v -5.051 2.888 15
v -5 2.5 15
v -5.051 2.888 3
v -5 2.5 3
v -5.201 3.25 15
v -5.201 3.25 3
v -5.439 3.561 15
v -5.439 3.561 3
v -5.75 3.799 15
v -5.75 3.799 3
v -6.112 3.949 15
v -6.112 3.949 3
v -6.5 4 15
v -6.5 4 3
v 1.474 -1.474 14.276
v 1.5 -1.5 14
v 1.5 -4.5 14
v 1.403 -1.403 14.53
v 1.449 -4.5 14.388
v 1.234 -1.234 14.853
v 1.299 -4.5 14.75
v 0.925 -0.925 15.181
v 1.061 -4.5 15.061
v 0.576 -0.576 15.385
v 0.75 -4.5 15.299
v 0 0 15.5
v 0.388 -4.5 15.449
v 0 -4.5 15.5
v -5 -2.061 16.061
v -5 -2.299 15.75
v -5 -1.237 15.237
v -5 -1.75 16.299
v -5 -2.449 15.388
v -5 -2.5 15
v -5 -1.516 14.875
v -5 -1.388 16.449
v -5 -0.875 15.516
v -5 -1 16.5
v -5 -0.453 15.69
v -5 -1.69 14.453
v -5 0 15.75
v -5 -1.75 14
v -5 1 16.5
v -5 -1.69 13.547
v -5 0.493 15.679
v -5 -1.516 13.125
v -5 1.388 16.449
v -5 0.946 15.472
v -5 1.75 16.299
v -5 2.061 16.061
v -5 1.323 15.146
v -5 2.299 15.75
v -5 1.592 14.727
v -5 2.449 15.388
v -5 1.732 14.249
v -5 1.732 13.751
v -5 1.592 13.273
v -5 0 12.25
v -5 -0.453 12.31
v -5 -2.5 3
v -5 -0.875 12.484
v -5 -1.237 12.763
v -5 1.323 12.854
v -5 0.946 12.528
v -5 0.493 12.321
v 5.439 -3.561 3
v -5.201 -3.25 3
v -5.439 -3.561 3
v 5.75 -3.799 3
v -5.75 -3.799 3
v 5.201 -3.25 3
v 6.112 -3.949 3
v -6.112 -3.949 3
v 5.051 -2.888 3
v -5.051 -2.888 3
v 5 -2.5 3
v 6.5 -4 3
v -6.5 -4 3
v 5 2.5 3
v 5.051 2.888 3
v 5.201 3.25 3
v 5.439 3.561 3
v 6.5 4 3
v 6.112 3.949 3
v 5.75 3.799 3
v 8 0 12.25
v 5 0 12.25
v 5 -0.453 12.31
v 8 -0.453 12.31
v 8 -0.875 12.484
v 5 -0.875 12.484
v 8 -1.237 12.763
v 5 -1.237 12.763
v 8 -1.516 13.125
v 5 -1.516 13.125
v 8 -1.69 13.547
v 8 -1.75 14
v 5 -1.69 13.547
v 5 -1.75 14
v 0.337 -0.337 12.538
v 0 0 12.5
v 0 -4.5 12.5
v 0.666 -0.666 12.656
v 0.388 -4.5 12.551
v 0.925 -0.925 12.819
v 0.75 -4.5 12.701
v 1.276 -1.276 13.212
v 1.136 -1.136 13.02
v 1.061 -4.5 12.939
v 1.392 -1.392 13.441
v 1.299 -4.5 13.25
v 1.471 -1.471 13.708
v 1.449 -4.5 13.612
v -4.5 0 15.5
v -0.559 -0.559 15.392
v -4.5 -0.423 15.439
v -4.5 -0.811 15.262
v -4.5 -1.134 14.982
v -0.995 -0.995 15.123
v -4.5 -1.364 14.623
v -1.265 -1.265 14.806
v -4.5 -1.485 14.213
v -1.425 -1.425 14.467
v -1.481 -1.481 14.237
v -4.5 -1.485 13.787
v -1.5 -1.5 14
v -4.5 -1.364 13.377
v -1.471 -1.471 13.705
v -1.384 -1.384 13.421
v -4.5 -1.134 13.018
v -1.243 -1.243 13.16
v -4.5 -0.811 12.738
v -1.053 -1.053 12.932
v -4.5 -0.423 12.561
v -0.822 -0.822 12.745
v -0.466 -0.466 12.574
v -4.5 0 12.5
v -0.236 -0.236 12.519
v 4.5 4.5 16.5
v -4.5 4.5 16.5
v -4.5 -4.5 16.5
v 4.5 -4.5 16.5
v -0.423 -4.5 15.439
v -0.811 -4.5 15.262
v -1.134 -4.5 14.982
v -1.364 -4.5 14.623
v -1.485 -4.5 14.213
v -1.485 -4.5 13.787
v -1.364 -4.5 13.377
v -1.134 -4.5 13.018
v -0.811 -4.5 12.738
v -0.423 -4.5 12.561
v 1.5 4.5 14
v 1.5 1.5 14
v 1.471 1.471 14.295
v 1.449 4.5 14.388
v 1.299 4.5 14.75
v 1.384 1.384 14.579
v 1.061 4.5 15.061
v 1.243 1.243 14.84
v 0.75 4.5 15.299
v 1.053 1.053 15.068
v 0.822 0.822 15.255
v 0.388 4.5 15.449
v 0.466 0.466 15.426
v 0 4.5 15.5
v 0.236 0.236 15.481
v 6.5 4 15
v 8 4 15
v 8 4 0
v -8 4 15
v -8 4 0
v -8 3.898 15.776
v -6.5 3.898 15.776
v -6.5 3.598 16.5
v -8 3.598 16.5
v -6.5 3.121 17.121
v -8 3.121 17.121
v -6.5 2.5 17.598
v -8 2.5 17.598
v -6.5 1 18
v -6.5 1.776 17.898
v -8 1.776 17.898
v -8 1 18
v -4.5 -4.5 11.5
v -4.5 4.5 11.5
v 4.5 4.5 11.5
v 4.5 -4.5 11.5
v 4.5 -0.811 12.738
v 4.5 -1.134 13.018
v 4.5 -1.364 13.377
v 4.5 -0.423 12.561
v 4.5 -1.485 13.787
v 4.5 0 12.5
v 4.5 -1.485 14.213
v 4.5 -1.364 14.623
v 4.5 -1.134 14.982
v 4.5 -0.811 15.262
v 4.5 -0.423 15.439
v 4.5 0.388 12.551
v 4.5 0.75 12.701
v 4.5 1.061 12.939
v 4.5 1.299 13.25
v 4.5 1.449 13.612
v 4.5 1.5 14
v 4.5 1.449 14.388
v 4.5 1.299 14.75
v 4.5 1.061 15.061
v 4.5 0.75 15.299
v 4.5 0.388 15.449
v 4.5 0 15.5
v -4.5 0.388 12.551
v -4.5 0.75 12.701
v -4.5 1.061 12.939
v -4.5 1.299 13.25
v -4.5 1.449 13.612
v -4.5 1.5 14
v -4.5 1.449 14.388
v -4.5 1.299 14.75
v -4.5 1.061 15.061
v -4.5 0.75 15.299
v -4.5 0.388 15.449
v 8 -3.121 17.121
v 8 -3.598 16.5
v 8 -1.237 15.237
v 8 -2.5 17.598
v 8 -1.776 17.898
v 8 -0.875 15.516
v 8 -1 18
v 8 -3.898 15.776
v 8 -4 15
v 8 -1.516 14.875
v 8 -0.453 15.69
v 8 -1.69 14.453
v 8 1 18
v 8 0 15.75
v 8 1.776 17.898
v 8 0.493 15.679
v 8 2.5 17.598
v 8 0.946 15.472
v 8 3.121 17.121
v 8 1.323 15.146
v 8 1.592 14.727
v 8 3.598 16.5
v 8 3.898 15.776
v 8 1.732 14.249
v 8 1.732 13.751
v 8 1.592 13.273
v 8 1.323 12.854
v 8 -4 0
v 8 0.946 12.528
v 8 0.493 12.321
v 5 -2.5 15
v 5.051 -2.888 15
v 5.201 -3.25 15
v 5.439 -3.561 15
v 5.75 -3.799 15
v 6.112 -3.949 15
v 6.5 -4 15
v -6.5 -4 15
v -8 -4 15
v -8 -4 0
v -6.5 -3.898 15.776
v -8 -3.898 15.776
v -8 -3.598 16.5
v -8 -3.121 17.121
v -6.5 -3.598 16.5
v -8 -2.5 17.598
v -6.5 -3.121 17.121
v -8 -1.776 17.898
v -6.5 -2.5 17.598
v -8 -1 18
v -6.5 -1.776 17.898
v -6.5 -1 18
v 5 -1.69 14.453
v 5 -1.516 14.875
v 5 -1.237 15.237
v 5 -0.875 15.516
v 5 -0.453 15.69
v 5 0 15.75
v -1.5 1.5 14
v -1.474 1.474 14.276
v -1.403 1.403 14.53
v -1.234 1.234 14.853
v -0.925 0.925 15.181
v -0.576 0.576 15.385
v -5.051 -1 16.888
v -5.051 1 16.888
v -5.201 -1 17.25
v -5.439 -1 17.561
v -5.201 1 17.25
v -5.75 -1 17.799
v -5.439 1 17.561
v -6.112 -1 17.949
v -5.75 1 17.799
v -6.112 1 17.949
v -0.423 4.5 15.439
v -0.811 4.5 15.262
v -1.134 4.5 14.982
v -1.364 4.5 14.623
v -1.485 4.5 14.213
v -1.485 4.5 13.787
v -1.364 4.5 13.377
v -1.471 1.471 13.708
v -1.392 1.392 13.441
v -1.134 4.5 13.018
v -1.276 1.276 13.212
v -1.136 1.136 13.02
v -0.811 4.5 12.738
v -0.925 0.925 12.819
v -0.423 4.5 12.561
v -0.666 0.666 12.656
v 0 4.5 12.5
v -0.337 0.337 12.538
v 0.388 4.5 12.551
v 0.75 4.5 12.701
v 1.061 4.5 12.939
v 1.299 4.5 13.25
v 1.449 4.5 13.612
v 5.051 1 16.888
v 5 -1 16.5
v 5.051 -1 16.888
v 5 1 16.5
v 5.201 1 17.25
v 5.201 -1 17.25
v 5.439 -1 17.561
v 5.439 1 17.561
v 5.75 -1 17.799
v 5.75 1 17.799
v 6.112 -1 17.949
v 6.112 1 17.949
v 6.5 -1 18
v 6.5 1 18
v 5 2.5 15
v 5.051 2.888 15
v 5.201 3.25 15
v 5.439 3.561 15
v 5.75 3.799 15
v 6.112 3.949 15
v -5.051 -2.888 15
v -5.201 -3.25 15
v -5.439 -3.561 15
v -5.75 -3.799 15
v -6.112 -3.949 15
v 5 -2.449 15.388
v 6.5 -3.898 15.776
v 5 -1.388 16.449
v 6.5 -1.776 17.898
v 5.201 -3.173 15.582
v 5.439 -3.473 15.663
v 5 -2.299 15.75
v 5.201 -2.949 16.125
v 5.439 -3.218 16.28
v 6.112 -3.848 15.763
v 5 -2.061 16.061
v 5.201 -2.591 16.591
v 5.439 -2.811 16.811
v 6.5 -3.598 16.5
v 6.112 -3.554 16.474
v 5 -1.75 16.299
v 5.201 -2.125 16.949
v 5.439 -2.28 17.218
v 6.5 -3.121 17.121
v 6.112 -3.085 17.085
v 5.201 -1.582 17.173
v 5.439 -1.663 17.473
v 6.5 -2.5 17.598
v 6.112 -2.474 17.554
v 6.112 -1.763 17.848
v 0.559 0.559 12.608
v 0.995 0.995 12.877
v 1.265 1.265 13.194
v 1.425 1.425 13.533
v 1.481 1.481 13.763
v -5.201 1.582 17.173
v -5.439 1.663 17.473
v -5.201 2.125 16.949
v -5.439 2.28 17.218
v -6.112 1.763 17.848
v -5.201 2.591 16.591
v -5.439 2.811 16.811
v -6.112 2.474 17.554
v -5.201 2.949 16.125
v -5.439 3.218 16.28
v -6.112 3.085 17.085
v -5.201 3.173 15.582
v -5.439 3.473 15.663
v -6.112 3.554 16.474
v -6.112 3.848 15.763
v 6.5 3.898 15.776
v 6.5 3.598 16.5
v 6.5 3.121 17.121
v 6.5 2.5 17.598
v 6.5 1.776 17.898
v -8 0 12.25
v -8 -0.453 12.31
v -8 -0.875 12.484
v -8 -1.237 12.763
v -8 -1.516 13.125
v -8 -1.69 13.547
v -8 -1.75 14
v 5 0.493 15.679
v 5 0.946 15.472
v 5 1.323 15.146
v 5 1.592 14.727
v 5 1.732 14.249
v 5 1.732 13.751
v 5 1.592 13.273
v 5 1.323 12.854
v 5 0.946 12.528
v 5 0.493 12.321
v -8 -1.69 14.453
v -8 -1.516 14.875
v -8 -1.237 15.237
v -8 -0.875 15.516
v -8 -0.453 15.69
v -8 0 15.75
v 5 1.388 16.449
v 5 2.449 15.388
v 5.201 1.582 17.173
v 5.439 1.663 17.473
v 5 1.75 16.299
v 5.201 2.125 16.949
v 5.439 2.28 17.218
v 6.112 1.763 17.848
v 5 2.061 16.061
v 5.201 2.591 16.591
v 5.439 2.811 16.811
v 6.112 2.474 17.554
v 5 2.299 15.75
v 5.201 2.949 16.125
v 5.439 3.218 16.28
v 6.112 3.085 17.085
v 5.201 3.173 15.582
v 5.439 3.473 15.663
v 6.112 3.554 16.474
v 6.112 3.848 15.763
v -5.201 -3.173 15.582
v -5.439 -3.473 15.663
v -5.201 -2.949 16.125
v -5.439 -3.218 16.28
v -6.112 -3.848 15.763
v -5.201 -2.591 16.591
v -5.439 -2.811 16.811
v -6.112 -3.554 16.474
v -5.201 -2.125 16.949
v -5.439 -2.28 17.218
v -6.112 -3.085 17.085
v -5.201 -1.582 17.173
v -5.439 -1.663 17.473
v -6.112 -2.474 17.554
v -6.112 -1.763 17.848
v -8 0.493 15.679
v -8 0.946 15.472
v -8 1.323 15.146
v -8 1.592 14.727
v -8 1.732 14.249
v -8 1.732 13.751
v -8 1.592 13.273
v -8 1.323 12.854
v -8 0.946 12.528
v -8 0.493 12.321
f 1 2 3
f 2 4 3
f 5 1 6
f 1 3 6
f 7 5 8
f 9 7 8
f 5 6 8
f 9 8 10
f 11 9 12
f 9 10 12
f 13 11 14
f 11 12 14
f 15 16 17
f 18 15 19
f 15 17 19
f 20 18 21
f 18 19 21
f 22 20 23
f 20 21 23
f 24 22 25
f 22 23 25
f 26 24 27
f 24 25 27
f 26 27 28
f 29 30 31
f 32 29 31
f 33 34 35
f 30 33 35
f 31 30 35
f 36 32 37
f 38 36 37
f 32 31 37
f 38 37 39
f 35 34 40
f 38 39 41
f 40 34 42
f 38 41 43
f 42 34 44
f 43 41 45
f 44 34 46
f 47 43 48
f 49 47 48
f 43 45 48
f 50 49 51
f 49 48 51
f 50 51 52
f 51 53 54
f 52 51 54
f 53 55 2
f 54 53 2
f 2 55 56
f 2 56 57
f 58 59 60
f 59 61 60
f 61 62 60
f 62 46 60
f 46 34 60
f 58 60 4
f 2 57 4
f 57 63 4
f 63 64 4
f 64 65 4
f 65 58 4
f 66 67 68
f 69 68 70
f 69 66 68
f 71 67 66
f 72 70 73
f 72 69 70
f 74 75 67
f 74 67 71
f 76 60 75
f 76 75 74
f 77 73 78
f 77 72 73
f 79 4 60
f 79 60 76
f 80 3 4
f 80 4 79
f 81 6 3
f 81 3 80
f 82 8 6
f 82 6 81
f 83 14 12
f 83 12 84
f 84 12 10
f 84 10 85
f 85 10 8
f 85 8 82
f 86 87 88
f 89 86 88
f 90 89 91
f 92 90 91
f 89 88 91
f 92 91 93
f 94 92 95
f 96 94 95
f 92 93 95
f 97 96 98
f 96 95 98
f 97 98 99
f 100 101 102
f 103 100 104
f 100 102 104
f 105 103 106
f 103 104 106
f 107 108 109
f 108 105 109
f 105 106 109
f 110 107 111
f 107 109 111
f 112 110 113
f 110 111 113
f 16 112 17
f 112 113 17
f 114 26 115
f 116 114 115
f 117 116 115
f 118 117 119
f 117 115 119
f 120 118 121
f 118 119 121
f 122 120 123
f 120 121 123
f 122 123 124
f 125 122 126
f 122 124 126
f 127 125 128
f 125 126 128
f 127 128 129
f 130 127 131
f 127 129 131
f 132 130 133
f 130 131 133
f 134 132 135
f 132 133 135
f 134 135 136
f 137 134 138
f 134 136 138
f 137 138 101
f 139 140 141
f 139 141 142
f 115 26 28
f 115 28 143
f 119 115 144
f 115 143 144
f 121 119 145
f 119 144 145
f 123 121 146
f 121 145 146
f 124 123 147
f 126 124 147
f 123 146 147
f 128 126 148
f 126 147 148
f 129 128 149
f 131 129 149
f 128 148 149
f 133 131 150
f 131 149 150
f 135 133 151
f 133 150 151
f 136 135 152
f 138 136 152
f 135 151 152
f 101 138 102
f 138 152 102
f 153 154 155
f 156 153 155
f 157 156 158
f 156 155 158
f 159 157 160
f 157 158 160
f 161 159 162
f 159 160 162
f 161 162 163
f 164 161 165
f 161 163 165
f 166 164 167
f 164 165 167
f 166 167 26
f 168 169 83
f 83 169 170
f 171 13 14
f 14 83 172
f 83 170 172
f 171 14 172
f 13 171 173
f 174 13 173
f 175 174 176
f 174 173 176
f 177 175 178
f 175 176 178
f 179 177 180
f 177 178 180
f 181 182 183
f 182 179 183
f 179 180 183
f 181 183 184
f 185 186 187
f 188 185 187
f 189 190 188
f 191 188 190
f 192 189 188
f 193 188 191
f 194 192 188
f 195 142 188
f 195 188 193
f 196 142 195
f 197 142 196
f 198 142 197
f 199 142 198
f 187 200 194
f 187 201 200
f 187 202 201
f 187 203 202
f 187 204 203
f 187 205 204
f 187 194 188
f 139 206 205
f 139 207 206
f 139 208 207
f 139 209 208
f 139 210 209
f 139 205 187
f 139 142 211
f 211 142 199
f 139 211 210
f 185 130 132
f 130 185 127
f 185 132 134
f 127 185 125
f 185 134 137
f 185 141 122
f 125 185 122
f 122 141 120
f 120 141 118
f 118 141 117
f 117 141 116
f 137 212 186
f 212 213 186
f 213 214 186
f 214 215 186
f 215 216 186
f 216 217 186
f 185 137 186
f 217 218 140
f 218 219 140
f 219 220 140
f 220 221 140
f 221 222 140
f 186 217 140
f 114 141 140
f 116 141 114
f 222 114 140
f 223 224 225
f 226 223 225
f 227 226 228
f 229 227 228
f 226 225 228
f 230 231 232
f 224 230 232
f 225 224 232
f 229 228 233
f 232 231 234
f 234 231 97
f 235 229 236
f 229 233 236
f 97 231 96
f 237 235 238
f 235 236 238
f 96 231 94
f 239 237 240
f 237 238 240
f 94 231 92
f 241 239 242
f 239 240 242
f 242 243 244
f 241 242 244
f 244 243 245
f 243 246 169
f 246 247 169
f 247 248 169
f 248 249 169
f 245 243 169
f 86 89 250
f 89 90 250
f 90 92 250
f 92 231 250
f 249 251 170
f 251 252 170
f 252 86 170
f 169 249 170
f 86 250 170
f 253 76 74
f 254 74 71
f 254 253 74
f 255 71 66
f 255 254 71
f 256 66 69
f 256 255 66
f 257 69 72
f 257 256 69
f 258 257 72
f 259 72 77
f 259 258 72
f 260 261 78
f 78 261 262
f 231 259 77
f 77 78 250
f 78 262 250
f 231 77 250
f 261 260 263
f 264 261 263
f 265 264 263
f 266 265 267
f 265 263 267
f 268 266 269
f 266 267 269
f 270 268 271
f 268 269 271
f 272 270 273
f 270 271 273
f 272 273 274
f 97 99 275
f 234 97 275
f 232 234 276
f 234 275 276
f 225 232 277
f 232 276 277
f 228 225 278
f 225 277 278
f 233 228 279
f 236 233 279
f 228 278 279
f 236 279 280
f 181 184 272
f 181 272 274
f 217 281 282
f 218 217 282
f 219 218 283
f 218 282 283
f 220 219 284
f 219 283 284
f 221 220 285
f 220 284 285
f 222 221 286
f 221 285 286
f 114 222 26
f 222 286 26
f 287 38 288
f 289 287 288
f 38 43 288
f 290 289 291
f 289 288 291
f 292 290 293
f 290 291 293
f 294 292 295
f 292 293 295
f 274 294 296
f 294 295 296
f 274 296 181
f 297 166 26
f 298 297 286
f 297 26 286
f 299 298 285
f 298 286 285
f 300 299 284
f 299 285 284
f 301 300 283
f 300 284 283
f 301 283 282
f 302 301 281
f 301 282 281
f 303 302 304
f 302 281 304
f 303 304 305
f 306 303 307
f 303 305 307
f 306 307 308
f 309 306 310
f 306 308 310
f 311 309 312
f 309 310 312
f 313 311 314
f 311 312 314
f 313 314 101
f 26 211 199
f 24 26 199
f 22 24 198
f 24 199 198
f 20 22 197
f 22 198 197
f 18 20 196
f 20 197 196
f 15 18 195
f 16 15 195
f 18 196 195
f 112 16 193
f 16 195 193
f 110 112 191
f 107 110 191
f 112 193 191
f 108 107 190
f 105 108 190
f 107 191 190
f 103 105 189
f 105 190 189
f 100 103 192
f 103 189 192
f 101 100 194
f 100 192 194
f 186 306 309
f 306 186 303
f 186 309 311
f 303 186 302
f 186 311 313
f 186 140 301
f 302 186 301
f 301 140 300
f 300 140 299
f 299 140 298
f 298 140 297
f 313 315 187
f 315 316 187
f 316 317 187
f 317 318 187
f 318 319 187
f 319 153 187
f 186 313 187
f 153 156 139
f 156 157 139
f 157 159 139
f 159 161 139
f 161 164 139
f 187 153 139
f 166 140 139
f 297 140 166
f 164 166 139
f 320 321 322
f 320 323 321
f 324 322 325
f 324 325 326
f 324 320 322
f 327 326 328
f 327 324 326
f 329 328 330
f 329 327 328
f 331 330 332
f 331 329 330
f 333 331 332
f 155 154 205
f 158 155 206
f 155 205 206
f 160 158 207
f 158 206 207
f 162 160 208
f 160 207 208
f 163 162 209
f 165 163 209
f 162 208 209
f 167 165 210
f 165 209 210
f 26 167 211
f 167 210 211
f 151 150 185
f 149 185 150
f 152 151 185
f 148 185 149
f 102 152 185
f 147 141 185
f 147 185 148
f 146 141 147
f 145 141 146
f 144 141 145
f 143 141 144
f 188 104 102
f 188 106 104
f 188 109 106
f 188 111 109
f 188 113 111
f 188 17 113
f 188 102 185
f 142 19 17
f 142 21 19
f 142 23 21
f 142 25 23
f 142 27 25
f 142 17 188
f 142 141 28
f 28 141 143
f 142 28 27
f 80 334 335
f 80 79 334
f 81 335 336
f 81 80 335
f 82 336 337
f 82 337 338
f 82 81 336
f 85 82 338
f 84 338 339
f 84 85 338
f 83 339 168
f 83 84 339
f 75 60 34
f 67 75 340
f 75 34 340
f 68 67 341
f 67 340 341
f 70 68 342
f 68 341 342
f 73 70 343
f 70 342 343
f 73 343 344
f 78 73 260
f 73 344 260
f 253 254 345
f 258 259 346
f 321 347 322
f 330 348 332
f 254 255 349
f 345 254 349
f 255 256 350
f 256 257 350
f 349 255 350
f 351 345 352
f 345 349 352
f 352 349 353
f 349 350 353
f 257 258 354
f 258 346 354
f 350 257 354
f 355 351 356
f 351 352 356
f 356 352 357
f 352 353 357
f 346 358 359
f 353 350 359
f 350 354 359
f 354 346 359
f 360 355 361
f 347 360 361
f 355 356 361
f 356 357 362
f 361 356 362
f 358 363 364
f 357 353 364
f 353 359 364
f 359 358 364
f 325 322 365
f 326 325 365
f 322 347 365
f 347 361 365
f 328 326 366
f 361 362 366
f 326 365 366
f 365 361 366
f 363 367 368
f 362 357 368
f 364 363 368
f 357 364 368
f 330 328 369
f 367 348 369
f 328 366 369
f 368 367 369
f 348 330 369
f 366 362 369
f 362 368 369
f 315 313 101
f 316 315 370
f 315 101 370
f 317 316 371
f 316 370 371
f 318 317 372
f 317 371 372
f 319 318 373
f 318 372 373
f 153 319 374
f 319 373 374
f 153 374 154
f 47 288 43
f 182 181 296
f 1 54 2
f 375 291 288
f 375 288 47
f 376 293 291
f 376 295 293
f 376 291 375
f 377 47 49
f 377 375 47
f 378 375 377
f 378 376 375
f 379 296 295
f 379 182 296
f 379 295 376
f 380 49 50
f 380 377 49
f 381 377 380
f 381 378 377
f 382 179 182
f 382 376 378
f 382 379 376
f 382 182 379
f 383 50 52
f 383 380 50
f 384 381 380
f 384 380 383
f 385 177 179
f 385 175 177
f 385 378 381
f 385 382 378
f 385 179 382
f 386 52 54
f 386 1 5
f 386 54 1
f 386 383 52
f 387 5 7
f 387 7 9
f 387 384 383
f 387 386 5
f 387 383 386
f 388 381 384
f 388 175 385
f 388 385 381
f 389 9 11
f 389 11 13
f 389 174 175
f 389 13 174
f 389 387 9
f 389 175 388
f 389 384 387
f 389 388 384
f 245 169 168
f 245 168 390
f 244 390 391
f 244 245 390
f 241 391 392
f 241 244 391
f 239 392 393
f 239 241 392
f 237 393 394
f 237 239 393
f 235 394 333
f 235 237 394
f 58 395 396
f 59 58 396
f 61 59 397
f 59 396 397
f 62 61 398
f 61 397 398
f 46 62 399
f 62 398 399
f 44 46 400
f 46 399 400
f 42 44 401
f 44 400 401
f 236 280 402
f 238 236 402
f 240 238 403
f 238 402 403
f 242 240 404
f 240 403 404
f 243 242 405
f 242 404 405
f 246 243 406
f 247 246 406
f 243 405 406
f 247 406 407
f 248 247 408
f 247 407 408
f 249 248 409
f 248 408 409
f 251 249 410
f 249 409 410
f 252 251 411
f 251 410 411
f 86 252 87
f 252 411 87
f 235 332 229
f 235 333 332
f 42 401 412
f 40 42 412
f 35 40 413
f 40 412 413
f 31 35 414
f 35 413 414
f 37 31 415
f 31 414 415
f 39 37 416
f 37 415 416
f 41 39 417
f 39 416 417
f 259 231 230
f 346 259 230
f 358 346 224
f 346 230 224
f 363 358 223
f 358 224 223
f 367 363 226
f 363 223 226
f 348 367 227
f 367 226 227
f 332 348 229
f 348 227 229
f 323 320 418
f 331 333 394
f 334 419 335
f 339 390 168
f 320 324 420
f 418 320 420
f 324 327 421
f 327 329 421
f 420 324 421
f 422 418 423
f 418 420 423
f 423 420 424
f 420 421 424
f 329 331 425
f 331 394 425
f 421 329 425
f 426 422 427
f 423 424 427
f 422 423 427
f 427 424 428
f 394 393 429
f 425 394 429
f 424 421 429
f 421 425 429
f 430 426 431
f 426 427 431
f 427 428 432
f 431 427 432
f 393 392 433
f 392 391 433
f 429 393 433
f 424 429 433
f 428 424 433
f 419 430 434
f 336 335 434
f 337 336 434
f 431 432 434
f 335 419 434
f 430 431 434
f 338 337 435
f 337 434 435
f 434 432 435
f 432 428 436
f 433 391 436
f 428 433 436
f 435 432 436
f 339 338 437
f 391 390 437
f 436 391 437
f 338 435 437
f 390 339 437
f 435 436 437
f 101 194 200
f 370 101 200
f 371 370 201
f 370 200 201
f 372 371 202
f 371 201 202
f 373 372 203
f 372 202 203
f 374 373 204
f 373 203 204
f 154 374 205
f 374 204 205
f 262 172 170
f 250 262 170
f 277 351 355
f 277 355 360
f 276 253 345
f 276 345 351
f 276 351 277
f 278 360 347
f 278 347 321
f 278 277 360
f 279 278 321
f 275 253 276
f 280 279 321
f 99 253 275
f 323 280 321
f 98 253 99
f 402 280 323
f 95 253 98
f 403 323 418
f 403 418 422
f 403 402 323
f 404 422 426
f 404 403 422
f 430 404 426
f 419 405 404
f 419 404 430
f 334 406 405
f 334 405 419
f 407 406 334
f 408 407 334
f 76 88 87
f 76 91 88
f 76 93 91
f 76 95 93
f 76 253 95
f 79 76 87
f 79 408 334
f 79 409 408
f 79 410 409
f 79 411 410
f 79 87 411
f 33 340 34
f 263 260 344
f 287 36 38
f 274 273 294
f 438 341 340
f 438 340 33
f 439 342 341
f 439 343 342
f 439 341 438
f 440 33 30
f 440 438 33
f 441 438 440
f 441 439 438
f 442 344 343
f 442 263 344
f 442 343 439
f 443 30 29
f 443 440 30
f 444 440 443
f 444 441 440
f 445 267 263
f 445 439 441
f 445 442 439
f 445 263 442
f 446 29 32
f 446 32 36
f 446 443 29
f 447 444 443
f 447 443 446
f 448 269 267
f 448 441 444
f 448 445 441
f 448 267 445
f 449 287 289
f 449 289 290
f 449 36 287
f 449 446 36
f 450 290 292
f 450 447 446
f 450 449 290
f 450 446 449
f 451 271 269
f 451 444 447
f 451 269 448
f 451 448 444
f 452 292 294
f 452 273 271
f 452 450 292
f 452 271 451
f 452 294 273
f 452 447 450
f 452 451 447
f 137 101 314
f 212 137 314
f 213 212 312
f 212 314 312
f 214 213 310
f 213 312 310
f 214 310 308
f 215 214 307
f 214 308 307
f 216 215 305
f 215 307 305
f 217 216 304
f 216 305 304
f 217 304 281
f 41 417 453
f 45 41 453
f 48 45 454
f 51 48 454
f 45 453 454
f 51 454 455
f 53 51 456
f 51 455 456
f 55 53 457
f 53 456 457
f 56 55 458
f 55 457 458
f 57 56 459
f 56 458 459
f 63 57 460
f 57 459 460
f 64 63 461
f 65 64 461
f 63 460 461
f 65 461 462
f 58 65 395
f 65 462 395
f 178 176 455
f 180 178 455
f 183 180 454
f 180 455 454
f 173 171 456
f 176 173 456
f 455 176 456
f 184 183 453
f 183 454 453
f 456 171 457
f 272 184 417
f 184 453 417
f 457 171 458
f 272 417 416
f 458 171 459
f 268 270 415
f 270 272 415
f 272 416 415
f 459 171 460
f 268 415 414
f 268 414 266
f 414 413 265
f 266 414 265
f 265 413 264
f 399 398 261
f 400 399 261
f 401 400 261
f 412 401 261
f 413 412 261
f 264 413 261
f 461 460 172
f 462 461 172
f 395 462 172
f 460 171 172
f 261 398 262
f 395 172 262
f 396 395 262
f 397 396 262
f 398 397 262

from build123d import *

# Parameters (mm, degrees)
F0_W      = 16
F0_H      = 4
F1_DEPTH  = 3
F2_W      = 3
F2_H      = 8
F3_DEPTH  = 15
F8_R      = 3
F7_W      = 9
F7_H      = 9
F9_DEPTH  = 2.5
F11_DEPTH = 9
F13_DEPTH = 9
F15_DEPTH = 16
F16_R     = 1.5


with BuildPart() as f1:
    # F0 (on Top) → F1 (new body)
    with BuildSketch(Plane.XY):
        with Locations((0, 2)):
            Rectangle(F0_W, F0_H)
        with Locations((0, -2)):
            Rectangle(F0_W, F0_H)
    extrude(amount=F1_DEPTH)

    # F2 (on face) → F3 (join)
    with BuildSketch(Plane.XY.offset(3)):
        Polygon((-5, 4), (-8, 4), (-8, -4), (-5, -4), (-5, 0), align=None)
        with Locations((6.5, 0)):
            Rectangle(F2_W, F2_H)
    extrude(amount=F3_DEPTH)

    # F8
    f8_edges = [f1.edges().sort_by_distance(p)[0] for p in [
        (-6.5, 4, 18),
        (-6.5, -4, 18),
        (6.5, -4, 18),
        (6.5, 4, 18),
    ]]
    fillet(f8_edges, radius=F8_R)

    # F14 (on face) → F15 (cut, through all)
    with BuildSketch(Plane(origin=(-8, 0, 0), x_dir=(0, -1, 0), z_dir=(-1, 0, 0))):
        with BuildLine():
            ThreePointArc((0, 12.25), (1.2374368671, 12.7625631329), (1.75, 14))
            ThreePointArc((1.75, 14), (1.2374368671, 15.2374368671), (0, 15.75))
            Line((0, 15.75), (0, 12.25))
        make_face()
        with BuildLine():
            Line((0, 12.25), (0, 15.75))
            ThreePointArc((0, 15.75), (-1.75, 14), (0, 12.25))
        make_face()
    extrude(amount=-F15_DEPTH, mode=Mode.SUBTRACT)

    # F16
    f16_edges = [f1.edges().sort_by_distance(p)[0] for p in [
        (-5, 0, 18),
        (5, 0, 18),
    ]]
    fillet(f16_edges, radius=F16_R)


with BuildPart() as f9:
    # F7 (on plane+point) → F9 (new body, symmetric)
    with BuildSketch(Plane.XY.offset(14)):
        Rectangle(F7_W, F7_H)
    extrude(amount=F9_DEPTH, both=True)

    # F10 (on face) → F11 (cut, through all)
    with BuildSketch(Plane.XZ.offset(4.5)):
        with BuildLine():
            ThreePointArc((0, 12.5), (1.0606601718, 12.9393398282), (1.5, 14))
            ThreePointArc((1.5, 14), (1.0606601718, 15.0606601718), (0, 15.5))
            Line((0, 15.5), (0, 12.5))
        make_face()
        with BuildLine():
            Line((0, 12.5), (0, 15.5))
            ThreePointArc((0, 15.5), (-1.5, 14), (0, 12.5))
        make_face()
    extrude(amount=-F11_DEPTH, mode=Mode.SUBTRACT)

    # F12 (on face) → F13 (cut, through all)
    with BuildSketch(Plane.YZ.offset(4.5)):
        with BuildLine():
            ThreePointArc((0, 12.5), (1.0606601718, 12.9393398282), (1.5, 14))
            ThreePointArc((1.5, 14), (1.0606601718, 15.0606601718), (0, 15.5))
            Line((0, 15.5), (0, 12.5))
        make_face()
        with BuildLine():
            Line((0, 12.5), (0, 15.5))
            ThreePointArc((0, 15.5), (-1.5, 14), (0, 12.5))
        make_face()
    extrude(amount=-F13_DEPTH, mode=Mode.SUBTRACT)


solid = Compound([f1.part, f9.part])
